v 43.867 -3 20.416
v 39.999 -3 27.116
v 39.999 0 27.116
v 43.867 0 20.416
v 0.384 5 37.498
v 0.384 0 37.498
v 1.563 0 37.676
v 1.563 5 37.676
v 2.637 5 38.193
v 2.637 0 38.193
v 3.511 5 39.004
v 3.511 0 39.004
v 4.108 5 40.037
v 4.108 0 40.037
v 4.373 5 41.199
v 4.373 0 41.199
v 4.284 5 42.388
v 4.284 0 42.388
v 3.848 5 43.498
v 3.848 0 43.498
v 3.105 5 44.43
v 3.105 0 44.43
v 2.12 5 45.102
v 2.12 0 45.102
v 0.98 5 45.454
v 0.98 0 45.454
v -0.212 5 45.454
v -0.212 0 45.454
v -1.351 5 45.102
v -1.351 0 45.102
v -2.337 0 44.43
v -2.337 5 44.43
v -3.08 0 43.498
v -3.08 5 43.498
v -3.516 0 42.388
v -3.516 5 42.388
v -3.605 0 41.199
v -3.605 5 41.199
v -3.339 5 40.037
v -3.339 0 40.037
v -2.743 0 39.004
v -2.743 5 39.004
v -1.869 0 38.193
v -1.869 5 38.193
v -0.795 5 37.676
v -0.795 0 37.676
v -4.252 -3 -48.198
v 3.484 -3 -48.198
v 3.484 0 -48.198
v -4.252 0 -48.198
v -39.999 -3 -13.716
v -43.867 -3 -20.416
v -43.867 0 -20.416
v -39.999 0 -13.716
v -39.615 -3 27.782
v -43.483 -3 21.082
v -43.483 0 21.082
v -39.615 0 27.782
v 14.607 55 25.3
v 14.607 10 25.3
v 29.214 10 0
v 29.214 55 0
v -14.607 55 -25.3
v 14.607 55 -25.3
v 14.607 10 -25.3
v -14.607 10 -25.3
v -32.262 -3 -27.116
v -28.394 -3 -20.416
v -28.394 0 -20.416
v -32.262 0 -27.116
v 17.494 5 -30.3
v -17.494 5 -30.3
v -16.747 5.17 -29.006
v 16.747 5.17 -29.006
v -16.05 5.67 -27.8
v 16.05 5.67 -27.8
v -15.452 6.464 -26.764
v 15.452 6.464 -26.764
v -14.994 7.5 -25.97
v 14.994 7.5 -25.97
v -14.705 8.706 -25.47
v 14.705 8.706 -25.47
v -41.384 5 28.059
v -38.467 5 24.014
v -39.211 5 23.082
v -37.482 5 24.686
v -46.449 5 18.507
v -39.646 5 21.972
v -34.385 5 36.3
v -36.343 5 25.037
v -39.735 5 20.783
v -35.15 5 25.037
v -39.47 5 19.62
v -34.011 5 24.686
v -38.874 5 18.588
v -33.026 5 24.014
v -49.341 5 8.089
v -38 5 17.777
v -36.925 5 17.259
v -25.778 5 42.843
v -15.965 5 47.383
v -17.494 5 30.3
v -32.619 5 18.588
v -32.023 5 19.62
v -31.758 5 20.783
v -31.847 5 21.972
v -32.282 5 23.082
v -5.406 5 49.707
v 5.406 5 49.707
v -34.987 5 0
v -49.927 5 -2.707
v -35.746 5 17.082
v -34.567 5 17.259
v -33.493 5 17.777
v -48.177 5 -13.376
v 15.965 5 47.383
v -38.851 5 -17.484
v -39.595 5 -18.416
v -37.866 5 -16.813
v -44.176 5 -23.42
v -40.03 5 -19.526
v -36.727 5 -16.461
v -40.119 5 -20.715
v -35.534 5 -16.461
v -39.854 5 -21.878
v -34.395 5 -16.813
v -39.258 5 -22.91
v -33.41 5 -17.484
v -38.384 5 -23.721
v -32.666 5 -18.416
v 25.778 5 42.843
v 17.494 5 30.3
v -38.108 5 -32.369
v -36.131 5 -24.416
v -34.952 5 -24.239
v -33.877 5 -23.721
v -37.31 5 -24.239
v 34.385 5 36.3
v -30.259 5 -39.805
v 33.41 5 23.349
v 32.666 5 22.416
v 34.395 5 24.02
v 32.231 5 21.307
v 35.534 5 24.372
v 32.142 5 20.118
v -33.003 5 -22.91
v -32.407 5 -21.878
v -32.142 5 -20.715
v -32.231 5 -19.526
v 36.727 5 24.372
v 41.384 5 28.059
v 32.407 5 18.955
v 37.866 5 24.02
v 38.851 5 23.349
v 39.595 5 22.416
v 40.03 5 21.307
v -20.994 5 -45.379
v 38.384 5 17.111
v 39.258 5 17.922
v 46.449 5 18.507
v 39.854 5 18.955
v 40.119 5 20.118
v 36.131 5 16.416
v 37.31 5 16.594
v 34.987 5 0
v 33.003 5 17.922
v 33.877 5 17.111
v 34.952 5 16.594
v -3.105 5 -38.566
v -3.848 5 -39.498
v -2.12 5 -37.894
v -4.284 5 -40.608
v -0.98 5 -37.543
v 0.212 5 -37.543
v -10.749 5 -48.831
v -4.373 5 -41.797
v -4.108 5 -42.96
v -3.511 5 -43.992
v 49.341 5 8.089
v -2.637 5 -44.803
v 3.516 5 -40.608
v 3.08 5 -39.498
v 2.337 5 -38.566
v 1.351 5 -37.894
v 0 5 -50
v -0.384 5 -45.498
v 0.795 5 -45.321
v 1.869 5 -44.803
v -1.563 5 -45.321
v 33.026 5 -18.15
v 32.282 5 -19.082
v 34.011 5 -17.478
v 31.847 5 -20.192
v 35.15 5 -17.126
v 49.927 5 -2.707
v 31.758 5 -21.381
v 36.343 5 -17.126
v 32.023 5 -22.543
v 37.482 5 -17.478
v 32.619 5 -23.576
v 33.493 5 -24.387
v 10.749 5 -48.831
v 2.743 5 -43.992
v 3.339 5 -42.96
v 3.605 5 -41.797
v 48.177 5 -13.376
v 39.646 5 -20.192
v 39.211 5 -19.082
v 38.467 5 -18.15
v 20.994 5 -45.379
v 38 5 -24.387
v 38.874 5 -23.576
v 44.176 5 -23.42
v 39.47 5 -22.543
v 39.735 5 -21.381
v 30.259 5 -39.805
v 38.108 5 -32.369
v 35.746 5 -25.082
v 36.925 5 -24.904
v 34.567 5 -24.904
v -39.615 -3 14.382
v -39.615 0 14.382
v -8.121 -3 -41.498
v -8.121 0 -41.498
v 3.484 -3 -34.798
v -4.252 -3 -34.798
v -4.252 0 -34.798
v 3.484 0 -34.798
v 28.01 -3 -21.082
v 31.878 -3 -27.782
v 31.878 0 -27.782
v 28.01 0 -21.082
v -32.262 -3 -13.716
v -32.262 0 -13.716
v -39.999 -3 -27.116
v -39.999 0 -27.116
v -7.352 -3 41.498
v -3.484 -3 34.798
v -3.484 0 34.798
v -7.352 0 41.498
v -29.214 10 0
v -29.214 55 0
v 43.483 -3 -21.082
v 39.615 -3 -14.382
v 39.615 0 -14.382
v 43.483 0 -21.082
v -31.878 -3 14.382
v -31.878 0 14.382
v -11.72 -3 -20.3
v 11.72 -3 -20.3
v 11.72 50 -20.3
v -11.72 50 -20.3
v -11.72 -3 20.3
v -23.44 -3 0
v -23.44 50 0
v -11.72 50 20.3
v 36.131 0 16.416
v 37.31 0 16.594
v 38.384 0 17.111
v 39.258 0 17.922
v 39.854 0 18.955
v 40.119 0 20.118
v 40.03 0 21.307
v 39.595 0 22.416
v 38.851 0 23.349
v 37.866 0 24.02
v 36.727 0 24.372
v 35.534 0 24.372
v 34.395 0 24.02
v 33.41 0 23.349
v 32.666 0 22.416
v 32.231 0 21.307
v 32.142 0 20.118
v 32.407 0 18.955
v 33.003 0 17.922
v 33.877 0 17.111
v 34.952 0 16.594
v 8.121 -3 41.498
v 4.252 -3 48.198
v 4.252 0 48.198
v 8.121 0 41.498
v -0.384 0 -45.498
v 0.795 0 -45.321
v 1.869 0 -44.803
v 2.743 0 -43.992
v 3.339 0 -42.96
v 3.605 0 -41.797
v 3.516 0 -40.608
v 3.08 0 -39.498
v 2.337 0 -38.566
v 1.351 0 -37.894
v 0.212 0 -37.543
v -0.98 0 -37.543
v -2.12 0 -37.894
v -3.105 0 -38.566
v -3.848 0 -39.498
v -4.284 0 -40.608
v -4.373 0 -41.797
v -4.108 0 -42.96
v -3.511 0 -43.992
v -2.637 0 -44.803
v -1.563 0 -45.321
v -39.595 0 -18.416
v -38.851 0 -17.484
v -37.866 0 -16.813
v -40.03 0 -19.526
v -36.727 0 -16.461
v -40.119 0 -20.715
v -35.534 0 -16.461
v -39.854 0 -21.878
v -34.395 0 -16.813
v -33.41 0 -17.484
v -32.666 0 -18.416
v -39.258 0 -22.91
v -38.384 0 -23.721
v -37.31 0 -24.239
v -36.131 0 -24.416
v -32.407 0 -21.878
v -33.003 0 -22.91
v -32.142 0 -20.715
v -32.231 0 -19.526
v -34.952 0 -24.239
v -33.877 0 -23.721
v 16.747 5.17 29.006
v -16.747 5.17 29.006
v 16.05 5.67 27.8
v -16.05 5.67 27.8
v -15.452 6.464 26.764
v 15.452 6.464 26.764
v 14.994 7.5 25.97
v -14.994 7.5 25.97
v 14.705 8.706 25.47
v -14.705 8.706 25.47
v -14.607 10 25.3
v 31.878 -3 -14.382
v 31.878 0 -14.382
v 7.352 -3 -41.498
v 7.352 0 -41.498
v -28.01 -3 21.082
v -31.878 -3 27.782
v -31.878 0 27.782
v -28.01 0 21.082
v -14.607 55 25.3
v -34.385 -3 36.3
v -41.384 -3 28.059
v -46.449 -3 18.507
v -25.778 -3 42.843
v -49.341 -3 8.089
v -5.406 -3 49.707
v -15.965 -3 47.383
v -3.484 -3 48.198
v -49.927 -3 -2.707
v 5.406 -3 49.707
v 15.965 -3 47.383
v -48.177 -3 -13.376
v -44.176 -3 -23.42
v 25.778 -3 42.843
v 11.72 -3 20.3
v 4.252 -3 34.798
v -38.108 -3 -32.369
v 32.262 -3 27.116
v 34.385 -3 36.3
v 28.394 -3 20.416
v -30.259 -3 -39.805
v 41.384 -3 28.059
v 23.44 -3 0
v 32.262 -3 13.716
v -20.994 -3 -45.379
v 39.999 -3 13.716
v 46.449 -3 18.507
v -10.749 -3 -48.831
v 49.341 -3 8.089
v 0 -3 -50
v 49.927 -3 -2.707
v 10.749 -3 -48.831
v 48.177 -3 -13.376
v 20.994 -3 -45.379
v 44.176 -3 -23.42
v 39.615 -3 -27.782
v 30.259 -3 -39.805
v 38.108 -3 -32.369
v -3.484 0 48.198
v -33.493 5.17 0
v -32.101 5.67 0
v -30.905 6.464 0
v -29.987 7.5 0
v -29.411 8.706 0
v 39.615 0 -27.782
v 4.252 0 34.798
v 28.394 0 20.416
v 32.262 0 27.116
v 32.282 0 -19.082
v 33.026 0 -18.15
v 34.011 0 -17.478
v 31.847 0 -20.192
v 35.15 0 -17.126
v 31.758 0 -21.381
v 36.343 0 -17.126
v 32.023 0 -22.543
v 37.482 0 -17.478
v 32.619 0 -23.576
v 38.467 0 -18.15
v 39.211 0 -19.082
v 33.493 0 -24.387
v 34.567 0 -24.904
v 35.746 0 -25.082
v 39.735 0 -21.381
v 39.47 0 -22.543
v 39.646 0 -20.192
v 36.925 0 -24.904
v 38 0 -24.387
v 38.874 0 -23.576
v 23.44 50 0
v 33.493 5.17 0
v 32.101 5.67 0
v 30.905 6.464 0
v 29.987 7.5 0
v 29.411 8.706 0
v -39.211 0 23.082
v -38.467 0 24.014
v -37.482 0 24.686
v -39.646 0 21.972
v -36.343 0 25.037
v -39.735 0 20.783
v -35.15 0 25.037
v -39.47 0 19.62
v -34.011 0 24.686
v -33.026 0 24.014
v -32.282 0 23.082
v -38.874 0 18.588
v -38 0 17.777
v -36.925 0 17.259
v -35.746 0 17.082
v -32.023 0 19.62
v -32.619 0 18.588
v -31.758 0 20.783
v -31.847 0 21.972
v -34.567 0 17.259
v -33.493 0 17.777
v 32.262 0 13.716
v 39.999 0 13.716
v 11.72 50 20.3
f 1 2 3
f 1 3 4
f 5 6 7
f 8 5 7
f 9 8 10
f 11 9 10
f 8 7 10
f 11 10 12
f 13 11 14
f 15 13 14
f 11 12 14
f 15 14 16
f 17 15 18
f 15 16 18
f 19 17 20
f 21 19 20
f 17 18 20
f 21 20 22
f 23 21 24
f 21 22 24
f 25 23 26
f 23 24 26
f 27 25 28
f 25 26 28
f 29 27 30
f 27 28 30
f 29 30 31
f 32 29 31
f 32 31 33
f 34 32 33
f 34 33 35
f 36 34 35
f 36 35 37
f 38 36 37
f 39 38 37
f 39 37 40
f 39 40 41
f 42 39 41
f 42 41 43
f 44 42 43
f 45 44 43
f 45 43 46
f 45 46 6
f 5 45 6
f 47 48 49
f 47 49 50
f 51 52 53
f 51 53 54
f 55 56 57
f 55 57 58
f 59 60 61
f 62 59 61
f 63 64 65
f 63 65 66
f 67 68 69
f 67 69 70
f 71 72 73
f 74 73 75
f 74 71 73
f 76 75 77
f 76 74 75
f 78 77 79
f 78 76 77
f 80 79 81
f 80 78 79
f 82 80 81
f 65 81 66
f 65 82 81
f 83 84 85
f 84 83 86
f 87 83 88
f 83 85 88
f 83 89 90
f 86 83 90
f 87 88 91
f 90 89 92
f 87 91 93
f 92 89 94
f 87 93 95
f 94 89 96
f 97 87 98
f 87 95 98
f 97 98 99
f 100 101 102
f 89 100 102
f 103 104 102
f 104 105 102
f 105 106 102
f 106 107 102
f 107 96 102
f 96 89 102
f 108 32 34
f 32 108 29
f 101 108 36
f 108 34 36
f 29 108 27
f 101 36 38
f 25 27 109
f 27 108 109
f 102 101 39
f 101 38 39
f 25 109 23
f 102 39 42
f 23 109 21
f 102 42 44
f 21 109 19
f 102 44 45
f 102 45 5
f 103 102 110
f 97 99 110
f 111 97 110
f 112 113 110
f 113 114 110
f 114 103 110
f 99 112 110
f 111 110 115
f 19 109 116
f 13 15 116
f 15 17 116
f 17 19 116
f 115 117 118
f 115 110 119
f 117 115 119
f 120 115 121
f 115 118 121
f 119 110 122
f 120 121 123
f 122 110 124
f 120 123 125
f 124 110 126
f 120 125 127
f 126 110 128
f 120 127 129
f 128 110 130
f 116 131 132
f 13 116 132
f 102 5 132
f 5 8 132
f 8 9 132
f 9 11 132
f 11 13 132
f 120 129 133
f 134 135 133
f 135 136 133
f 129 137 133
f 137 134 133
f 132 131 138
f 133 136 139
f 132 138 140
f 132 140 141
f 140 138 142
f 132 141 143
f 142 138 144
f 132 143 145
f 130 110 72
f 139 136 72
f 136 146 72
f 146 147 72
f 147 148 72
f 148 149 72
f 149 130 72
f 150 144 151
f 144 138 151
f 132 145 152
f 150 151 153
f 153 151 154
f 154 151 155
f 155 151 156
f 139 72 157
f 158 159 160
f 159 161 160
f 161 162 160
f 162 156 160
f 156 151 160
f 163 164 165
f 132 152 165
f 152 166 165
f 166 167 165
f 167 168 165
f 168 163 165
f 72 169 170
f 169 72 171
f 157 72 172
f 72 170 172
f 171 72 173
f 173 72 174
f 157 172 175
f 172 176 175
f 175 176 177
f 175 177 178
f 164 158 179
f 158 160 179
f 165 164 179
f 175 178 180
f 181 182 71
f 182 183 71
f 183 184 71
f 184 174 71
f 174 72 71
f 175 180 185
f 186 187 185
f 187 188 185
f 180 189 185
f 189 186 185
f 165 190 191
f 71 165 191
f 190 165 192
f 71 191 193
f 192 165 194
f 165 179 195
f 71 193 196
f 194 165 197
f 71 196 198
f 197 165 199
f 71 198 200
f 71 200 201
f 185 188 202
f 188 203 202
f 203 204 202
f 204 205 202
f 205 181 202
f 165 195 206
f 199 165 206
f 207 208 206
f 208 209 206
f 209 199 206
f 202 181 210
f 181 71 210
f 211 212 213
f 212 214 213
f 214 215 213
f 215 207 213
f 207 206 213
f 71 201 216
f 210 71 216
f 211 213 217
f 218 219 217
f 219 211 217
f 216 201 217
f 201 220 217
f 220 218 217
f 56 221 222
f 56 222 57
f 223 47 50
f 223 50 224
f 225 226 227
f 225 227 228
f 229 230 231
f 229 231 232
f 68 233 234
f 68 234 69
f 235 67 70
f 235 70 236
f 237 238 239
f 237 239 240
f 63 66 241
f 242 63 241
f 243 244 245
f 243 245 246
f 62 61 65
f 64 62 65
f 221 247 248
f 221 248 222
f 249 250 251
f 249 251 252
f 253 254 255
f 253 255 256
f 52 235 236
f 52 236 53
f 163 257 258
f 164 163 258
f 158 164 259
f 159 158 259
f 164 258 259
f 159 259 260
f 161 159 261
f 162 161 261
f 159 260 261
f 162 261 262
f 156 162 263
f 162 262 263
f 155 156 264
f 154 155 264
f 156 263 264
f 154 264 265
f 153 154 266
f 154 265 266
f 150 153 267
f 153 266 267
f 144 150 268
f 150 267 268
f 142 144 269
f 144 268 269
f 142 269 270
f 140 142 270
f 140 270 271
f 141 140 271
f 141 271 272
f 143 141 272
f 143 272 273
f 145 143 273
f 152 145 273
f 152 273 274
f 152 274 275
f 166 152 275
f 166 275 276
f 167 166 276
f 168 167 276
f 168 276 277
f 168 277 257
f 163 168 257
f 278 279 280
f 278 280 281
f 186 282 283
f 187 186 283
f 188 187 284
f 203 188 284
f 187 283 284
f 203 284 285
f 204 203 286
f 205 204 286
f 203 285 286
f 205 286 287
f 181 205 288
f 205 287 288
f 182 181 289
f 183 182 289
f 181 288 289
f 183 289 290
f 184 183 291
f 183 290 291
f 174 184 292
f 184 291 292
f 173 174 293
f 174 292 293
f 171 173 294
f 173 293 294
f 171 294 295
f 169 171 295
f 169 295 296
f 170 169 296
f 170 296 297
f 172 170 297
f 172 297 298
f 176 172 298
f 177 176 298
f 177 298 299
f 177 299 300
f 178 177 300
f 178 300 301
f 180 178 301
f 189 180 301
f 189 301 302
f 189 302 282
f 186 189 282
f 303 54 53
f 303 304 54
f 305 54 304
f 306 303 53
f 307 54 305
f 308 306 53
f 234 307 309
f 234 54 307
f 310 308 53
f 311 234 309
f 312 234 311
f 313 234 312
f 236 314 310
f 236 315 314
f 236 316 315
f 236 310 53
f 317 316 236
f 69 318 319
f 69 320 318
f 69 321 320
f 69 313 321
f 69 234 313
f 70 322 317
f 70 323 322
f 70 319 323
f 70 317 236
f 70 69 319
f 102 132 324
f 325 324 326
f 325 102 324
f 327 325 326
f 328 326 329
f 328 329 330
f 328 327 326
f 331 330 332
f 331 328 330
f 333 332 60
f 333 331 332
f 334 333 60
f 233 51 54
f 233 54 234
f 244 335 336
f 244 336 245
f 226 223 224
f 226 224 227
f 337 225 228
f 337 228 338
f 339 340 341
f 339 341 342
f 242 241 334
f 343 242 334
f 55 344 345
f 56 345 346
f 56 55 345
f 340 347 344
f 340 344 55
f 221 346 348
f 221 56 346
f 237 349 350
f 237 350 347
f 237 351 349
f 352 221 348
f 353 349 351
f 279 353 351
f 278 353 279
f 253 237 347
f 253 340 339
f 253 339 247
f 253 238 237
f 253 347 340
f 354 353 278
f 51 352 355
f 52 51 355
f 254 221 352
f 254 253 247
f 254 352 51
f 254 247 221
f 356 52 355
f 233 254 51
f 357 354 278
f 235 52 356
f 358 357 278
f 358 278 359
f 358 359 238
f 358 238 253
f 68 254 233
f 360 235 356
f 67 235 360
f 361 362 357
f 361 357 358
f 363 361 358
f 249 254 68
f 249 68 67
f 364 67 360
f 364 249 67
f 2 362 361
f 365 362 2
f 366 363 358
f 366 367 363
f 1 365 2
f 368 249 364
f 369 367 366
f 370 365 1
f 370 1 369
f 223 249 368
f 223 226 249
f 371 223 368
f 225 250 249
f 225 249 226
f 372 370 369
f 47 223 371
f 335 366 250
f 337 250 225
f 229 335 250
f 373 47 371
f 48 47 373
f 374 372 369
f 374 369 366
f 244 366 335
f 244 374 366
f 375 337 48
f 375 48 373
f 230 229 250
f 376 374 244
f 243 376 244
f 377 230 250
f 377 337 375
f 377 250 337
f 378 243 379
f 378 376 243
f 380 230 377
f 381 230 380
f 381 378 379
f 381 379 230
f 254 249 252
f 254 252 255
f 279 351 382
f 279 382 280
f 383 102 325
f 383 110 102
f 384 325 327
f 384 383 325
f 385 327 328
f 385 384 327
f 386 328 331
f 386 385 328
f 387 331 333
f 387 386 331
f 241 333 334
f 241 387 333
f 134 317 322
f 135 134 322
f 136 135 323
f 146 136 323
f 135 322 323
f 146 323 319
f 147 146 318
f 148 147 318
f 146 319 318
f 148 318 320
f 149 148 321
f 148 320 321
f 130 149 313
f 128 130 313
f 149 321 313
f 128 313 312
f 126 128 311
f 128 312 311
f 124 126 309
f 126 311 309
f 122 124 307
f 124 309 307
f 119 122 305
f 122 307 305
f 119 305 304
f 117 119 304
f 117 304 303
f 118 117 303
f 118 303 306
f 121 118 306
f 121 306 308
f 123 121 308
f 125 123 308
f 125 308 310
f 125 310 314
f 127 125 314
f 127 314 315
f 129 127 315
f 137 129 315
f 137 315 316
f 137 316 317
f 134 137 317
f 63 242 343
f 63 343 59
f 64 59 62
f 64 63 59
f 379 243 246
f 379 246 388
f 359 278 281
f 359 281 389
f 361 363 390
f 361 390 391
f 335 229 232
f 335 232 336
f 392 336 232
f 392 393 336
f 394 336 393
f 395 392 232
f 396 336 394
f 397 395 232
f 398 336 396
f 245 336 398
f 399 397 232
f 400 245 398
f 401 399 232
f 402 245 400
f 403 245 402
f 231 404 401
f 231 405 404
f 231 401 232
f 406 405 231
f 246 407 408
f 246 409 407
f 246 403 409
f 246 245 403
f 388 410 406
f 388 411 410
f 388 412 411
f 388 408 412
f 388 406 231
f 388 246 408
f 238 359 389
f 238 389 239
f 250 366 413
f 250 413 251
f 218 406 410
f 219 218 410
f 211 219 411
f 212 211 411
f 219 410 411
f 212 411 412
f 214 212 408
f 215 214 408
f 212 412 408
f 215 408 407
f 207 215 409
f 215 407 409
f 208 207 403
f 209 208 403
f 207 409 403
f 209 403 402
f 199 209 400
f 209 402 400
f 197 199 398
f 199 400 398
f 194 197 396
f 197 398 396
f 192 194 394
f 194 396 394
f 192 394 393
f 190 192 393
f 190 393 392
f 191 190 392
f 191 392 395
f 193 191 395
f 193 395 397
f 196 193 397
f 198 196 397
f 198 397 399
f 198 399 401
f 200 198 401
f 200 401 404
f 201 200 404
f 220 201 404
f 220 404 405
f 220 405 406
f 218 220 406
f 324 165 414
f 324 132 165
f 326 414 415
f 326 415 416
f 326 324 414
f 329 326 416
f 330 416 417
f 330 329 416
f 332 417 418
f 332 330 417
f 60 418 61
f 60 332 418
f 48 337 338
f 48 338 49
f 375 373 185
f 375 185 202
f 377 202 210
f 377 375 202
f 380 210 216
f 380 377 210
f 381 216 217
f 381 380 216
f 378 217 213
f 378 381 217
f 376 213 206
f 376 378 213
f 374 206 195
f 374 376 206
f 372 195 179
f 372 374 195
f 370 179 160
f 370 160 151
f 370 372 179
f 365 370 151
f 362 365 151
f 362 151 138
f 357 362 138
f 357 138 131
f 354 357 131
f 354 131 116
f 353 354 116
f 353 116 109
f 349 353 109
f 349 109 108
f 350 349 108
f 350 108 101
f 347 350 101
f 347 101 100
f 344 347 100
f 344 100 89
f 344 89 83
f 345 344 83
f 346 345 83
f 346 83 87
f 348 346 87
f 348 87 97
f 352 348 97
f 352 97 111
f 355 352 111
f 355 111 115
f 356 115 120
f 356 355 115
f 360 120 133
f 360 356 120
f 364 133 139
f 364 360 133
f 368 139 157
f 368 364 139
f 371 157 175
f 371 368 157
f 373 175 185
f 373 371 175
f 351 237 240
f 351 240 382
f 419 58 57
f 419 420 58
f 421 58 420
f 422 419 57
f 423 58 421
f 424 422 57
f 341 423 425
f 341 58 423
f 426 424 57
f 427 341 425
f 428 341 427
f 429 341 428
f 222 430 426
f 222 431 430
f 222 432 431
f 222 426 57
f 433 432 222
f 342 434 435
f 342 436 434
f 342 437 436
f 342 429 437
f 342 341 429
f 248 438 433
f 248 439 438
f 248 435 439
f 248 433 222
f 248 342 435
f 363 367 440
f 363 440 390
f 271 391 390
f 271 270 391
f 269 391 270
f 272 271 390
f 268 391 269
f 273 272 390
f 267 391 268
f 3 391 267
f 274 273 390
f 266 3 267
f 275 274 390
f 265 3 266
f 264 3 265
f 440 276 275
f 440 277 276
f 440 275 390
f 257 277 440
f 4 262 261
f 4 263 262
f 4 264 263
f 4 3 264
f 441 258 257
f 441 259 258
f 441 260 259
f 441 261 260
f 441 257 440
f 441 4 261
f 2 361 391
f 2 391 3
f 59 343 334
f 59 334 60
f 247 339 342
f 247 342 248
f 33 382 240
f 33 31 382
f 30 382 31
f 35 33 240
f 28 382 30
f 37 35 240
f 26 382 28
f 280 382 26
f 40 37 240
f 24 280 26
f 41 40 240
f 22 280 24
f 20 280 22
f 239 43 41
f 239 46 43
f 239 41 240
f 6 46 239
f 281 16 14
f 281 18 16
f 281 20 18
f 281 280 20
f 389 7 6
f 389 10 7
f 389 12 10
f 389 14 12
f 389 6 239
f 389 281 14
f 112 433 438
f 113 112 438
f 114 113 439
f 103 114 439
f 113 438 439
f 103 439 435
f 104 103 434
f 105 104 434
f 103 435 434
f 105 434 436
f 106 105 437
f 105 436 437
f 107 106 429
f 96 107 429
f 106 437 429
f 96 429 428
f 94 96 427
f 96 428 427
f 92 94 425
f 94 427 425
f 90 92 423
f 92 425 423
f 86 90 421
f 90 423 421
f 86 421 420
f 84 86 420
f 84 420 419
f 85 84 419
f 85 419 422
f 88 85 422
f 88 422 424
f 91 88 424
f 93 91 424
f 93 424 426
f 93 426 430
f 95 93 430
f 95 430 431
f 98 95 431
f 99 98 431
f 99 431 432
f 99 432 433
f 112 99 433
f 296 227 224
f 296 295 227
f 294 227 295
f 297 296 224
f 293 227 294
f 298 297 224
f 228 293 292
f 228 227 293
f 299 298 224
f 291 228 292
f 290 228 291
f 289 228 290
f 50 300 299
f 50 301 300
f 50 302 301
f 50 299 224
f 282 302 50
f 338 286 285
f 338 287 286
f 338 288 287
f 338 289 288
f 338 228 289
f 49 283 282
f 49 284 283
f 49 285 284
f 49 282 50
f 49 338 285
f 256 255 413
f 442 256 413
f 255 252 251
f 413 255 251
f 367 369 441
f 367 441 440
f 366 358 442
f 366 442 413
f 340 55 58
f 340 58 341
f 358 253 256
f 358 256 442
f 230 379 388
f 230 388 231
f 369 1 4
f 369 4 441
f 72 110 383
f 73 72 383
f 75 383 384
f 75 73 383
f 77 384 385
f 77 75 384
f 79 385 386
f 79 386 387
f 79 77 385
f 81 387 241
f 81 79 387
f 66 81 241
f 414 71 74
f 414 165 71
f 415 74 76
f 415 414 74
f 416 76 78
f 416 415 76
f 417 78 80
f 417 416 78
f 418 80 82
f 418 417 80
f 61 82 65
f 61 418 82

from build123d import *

# Parameters (mm, degrees)
BOSS_EXTRUDE1_DEPTH = 50
BOSS_EXTRUDE2_DEPTH = 5
SKETCH3_R           = 50
BOSS_EXTRUDE3_DEPTH = 5
FILLET1_R           = 5
BOSS_EXTRUDE4_START = 3
SKETCH5_R           = 50
BOSS_EXTRUDE4_DEPTH = 3
SKETCH5_3_R         = 4
CUT_EXTRUDE1_DEPTH  = 10


with BuildPart() as part:
    # Sketch1 → Boss-Extrude1 (new body)
    with BuildSketch(Plane(origin=(0, 0, 0), x_dir=(1, 0, 0), z_dir=(0, 1, 0))):
        Polygon((-29.213923621, 0), (-14.60696181, -25.3), (14.60696181, -25.3), (29.213923621, 0), (14.60696181, 25.3), (-14.60696181, 25.3), align=None)
        Polygon((23.440420929, 0), (11.720210465, -20.3), (-11.720210465, -20.3), (-23.440420929, 0), (-11.720210465, 20.3), (11.720210465, 20.3), align=None, mode=Mode.SUBTRACT)
    extrude(amount=BOSS_EXTRUDE1_DEPTH)

    # Sketch2 → Boss-Extrude2 (add)
    with BuildSketch(Plane(origin=(0, 50, 0), x_dir=(1, 0, 0), z_dir=(0, 1, 0))):
        Polygon((-14.60696181, 25.3), (-29.213923621, 0), (-14.60696181, -25.3), (14.60696181, -25.3), (29.213923621, 0), (14.60696181, 25.3), align=None)
    extrude(amount=BOSS_EXTRUDE2_DEPTH)

    # Sketch3 → Boss-Extrude3 (add)
    with BuildSketch(Plane.XZ):
        Circle(SKETCH3_R)
        Polygon((23.440420929, 0), (11.720210465, -20.3), (-11.720210465, -20.3), (-23.440420929, 0), (-11.720210465, 20.3), (11.720210465, 20.3), align=None, mode=Mode.SUBTRACT)
    extrude(amount=-BOSS_EXTRUDE3_DEPTH)

    # Fillet1
    fillet1_edges = [part.edges().sort_by_distance(p)[0] for p in [
        (0, 5, 25.3),
        (21.910442716, 5, 12.65),
        (21.910442716, 5, -12.65),
        (0, 5, -25.3),
        (-21.910442716, 5, 12.65),
        (-21.910442716, 5, -12.65),
    ]]
    fillet(fillet1_edges, radius=FILLET1_R)

    # Sketch5 → Boss-Extrude4 (add)
    with BuildSketch(Plane.XZ.offset(BOSS_EXTRUDE4_START)):
        Circle(SKETCH5_R)
        Polygon((-4.252388339, -34.798222074), (3.484105268, -34.798222074), (7.352352072, -41.498222074), (3.484105268, -48.198222074), (-4.252388339, -48.198222074), (-8.120635142, -41.498222074), align=None, mode=Mode.SUBTRACT)
        Polygon((-32.262338492, -13.716434709), (-28.394091688, -20.416434709), (-32.262338492, -27.116434709), (-39.998832099, -27.116434709), (-43.867078902, -20.416434709), (-39.998832099, -13.716434709), align=None, mode=Mode.SUBTRACT)
        Polygon((28.009950153, -21.081787365), (31.878196957, -14.381787365), (39.614690564, -14.381787365), (43.482937367, -21.081787365), (39.614690564, -27.781787365), (31.878196957, -27.781787365), align=None, mode=Mode.SUBTRACT)
        Polygon((-28.009950153, 21.081787365), (-31.878196957, 14.381787365), (-39.614690564, 14.381787365), (-43.482937367, 21.081787365), (-39.614690564, 27.781787365), (-31.878196957, 27.781787365), align=None, mode=Mode.SUBTRACT)
        Polygon((-23.440420929, 0), (-11.720210465, 20.3), (11.720210465, 20.3), (23.440420929, 0), (11.720210465, -20.3), (-11.720210465, -20.3), align=None, mode=Mode.SUBTRACT)
        Polygon((32.262338492, 13.716434709), (28.394091688, 20.416434709), (32.262338492, 27.116434709), (39.998832099, 27.116434709), (43.867078902, 20.416434709), (39.998832099, 13.716434709), align=None, mode=Mode.SUBTRACT)
        Polygon((4.252388339, 34.798222074), (-3.484105268, 34.798222074), (-7.352352072, 41.498222074), (-3.484105268, 48.198222074), (4.252388339, 48.198222074), (8.120635142, 41.498222074), align=None, mode=Mode.SUBTRACT)
    extrude(amount=-BOSS_EXTRUDE4_DEPTH)

    # Sketch5<3> → Cut-Extrude1 (cut)
    with BuildSketch(Plane.XZ):
        with Locations((0.384141535, 41.498222074)):
            Circle(SKETCH5_3_R)
        with Locations((36.130585295, 20.416434709)):
            Circle(SKETCH5_3_R)
        with Locations((35.74644376, -21.081787365)):
            Circle(SKETCH5_3_R)
        with Locations((-0.384141535, -41.498222074)):
            Circle(SKETCH5_3_R)
        with Locations((-36.130585295, -20.416434709)):
            Circle(SKETCH5_3_R)
        with Locations((-35.74644376, 21.081787365)):
            Circle(SKETCH5_3_R)
    extrude(amount=-CUT_EXTRUDE1_DEPTH, mode=Mode.SUBTRACT)


solid = part.part
